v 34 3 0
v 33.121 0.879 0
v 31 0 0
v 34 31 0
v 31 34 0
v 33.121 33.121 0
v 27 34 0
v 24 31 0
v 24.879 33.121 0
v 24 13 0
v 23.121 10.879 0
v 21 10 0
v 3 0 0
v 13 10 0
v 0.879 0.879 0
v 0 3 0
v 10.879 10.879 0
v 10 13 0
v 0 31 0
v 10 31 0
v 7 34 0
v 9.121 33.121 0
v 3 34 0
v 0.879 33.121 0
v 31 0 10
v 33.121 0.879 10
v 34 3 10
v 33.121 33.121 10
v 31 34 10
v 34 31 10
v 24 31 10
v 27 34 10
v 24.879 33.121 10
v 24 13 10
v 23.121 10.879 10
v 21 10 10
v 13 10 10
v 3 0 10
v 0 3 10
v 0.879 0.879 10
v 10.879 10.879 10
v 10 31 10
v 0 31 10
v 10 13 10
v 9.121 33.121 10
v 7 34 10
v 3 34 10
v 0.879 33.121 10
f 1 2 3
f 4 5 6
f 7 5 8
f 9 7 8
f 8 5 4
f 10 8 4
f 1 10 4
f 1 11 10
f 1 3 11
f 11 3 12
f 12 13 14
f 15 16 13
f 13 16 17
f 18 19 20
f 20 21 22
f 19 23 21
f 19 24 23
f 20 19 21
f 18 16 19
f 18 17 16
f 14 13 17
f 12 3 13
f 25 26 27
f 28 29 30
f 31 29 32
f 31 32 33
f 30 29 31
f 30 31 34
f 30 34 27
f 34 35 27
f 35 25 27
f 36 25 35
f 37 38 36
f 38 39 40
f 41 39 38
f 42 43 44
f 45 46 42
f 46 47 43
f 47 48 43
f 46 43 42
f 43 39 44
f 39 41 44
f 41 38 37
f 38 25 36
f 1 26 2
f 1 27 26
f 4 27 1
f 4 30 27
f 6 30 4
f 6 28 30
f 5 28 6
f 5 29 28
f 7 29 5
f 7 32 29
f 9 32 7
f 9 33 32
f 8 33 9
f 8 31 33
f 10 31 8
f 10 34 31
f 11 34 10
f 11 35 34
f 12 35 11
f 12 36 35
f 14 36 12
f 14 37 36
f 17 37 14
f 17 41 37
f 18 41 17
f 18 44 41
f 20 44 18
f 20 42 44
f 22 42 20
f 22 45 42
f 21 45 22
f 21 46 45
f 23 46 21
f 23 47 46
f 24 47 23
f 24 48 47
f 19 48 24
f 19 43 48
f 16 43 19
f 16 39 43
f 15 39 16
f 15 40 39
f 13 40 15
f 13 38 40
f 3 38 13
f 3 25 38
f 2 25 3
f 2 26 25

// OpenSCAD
$fn = 32;

// ----------------------------------------------------------------------
// Eye lug: clevis, 10 mm thick
// ----------------------------------------------------------------------

// --- parameters (mm) ---
profile_height = 10;      // extrusion height
profile_points = 24;      // points of the closed outline

profile = [[0, 3], [0.879, 0.879], [3, 0], [31, 0], [33.121, 0.879], [34, 3], [34, 31], [33.121, 33.121], [31, 34], [27, 34], [24.879, 33.121], [24, 31], [24, 13], [23.121, 10.879], [21, 10], [13, 10], [10.879, 10.879], [10, 13], [10, 31], [9.121, 33.121], [7, 34], [3, 34], [0.879, 33.121], [0, 31]];  // single closed polygon, 24 points, counter clockwise

// --- the one profile operation ---
linear_extrude(height = profile_height) polygon(points = profile);
